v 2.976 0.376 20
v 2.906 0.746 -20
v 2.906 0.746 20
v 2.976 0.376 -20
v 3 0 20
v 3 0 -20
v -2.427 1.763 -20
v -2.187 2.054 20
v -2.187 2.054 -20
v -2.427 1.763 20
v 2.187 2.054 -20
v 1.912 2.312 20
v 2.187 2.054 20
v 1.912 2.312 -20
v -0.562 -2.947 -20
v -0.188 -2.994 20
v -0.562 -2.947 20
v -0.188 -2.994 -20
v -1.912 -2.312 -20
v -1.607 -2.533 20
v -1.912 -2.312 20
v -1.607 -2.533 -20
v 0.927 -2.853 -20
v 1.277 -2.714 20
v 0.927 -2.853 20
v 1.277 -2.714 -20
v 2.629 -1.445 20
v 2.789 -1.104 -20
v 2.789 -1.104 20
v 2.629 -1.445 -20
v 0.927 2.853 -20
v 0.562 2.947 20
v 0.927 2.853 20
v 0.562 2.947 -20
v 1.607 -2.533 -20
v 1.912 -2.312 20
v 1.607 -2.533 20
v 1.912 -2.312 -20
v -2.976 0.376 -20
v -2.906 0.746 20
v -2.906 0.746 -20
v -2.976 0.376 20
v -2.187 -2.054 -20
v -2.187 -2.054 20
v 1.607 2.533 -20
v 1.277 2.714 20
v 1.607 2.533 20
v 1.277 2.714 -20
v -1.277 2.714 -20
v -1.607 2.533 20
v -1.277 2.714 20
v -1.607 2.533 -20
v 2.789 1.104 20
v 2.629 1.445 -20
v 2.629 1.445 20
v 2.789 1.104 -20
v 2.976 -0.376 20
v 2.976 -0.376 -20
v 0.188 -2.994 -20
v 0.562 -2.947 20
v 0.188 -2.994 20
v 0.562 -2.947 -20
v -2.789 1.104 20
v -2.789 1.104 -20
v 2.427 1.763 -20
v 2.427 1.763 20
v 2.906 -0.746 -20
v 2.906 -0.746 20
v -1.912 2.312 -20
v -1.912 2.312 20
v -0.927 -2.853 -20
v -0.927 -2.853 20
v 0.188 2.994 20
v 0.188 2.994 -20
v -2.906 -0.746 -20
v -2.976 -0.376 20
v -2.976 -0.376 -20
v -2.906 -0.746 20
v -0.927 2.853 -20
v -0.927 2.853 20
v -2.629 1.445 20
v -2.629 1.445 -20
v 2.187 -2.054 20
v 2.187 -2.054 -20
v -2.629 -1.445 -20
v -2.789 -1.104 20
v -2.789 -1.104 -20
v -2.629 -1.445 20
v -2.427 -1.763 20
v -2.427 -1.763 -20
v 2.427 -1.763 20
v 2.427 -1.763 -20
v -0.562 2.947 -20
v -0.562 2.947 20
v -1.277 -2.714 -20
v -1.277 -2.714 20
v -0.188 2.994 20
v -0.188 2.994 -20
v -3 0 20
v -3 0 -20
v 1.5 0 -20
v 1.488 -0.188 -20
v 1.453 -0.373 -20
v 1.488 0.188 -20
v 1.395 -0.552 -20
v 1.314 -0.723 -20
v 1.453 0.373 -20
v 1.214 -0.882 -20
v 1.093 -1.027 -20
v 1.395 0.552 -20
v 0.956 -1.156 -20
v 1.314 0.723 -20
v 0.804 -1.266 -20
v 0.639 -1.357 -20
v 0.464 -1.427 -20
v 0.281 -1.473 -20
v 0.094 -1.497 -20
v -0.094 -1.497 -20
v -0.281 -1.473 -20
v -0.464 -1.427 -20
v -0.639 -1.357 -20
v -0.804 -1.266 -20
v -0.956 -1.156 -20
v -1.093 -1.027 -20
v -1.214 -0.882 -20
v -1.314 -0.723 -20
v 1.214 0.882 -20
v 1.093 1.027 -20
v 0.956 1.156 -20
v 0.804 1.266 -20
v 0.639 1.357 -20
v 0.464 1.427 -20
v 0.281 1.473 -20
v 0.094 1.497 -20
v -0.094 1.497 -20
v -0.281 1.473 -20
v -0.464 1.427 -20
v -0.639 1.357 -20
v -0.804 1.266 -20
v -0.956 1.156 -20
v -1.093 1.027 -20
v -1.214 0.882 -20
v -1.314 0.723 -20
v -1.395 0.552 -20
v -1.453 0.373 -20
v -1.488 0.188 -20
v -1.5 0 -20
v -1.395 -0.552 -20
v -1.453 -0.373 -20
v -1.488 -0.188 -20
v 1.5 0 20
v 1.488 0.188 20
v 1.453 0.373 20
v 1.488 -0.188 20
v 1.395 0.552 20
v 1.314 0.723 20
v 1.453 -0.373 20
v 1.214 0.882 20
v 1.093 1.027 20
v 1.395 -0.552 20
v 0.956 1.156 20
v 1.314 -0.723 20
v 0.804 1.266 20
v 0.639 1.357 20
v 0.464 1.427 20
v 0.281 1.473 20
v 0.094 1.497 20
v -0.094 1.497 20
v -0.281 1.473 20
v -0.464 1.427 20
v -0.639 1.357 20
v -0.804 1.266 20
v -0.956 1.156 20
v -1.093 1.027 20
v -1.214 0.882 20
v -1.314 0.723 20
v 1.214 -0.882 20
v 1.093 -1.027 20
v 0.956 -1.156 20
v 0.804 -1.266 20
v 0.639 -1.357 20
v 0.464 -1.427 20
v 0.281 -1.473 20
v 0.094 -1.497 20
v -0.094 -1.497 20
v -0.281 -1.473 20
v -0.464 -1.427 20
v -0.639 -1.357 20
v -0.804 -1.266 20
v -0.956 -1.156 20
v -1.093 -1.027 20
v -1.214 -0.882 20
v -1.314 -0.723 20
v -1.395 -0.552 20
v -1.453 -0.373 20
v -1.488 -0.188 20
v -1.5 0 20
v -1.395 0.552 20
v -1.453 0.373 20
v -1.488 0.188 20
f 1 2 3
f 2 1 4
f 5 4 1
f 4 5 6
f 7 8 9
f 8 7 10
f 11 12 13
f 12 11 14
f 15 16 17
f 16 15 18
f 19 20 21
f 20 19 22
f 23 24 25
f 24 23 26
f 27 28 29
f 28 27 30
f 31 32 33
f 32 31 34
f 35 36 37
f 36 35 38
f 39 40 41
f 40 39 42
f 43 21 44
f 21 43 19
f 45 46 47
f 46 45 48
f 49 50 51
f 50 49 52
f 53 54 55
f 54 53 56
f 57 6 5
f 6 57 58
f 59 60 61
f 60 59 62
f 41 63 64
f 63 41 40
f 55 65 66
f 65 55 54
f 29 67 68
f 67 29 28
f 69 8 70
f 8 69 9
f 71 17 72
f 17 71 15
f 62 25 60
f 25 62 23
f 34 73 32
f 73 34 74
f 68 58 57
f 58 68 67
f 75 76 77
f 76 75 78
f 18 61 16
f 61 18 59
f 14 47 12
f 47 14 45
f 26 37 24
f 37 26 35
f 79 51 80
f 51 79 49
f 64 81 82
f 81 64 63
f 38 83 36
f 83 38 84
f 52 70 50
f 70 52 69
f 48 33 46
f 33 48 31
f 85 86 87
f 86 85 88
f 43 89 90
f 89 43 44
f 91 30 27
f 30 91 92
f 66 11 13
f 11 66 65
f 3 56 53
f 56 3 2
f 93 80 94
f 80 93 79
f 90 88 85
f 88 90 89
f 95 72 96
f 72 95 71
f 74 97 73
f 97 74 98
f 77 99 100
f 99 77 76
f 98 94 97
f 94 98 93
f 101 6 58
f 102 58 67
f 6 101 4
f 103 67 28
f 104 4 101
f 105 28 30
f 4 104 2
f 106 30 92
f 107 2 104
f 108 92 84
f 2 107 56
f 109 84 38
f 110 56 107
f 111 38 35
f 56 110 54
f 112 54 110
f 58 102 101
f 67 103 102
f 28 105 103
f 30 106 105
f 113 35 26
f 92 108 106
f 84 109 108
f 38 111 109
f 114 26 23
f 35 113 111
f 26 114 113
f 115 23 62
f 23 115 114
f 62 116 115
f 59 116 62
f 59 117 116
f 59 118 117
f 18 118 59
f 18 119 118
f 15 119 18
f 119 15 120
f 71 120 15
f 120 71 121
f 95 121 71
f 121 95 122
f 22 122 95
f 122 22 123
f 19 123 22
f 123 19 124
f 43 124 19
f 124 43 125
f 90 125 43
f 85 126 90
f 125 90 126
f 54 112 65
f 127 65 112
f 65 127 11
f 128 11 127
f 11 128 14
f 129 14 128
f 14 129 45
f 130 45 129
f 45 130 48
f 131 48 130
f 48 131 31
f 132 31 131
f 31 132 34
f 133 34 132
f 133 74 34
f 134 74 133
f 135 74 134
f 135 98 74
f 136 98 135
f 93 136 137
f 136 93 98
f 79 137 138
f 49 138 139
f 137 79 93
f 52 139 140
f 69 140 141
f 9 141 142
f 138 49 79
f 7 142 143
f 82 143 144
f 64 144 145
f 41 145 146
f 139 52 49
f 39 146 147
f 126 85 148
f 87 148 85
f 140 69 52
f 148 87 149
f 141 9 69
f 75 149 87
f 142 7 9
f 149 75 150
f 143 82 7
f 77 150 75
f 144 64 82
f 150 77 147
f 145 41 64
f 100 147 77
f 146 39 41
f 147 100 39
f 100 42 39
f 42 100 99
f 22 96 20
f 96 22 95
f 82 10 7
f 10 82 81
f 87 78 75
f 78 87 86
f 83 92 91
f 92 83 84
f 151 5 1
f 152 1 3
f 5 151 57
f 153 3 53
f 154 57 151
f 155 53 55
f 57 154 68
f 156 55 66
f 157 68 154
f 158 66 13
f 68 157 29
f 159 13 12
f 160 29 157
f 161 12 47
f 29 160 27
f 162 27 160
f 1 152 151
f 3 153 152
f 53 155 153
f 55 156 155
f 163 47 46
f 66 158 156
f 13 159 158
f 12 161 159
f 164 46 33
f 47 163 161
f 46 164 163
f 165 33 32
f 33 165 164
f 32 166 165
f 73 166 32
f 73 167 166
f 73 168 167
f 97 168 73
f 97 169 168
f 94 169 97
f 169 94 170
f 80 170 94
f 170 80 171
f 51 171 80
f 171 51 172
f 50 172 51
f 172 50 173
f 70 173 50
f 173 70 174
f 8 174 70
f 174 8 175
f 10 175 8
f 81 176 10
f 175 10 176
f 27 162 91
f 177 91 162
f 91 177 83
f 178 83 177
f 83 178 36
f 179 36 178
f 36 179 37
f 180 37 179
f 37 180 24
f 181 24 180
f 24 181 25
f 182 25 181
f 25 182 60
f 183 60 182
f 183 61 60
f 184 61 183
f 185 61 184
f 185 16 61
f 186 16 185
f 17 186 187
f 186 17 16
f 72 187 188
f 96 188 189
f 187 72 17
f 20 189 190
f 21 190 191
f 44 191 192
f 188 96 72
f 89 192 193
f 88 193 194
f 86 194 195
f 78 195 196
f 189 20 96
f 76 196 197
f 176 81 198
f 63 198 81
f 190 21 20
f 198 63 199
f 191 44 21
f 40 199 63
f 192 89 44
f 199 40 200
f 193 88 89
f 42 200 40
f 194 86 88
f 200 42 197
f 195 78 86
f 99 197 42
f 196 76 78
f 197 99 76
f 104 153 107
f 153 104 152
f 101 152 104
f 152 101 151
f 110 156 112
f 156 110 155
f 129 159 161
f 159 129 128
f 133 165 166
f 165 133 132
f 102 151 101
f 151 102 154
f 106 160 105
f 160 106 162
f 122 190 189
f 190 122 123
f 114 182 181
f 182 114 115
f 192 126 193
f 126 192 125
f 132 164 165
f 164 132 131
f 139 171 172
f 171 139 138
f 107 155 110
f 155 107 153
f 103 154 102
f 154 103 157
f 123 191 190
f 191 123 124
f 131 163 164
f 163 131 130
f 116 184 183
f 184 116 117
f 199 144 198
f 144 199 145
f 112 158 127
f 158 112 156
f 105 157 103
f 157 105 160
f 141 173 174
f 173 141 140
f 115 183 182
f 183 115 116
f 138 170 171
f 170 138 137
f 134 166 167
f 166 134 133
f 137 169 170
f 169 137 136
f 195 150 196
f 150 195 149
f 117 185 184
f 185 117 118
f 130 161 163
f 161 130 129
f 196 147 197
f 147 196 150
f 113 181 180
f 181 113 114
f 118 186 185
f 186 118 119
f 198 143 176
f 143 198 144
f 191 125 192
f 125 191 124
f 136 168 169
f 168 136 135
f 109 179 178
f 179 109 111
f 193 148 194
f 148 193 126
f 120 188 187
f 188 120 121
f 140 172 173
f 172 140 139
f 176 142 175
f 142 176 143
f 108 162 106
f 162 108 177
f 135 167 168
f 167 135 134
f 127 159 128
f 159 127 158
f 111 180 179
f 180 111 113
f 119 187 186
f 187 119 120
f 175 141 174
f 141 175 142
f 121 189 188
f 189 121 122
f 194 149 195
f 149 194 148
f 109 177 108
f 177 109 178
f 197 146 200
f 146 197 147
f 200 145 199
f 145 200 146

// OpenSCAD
$fn = 50;


difference() {
	union() {
		translate(v = [0, 0, -20.0000000000]) {
			cylinder(h = 40, r = 3.0000000000);
		}
	}
	union() {
		translate(v = [0, 0, -100.0000000000]) {
			cylinder(h = 200, r = 1.5000000000);
		}
	}
}
